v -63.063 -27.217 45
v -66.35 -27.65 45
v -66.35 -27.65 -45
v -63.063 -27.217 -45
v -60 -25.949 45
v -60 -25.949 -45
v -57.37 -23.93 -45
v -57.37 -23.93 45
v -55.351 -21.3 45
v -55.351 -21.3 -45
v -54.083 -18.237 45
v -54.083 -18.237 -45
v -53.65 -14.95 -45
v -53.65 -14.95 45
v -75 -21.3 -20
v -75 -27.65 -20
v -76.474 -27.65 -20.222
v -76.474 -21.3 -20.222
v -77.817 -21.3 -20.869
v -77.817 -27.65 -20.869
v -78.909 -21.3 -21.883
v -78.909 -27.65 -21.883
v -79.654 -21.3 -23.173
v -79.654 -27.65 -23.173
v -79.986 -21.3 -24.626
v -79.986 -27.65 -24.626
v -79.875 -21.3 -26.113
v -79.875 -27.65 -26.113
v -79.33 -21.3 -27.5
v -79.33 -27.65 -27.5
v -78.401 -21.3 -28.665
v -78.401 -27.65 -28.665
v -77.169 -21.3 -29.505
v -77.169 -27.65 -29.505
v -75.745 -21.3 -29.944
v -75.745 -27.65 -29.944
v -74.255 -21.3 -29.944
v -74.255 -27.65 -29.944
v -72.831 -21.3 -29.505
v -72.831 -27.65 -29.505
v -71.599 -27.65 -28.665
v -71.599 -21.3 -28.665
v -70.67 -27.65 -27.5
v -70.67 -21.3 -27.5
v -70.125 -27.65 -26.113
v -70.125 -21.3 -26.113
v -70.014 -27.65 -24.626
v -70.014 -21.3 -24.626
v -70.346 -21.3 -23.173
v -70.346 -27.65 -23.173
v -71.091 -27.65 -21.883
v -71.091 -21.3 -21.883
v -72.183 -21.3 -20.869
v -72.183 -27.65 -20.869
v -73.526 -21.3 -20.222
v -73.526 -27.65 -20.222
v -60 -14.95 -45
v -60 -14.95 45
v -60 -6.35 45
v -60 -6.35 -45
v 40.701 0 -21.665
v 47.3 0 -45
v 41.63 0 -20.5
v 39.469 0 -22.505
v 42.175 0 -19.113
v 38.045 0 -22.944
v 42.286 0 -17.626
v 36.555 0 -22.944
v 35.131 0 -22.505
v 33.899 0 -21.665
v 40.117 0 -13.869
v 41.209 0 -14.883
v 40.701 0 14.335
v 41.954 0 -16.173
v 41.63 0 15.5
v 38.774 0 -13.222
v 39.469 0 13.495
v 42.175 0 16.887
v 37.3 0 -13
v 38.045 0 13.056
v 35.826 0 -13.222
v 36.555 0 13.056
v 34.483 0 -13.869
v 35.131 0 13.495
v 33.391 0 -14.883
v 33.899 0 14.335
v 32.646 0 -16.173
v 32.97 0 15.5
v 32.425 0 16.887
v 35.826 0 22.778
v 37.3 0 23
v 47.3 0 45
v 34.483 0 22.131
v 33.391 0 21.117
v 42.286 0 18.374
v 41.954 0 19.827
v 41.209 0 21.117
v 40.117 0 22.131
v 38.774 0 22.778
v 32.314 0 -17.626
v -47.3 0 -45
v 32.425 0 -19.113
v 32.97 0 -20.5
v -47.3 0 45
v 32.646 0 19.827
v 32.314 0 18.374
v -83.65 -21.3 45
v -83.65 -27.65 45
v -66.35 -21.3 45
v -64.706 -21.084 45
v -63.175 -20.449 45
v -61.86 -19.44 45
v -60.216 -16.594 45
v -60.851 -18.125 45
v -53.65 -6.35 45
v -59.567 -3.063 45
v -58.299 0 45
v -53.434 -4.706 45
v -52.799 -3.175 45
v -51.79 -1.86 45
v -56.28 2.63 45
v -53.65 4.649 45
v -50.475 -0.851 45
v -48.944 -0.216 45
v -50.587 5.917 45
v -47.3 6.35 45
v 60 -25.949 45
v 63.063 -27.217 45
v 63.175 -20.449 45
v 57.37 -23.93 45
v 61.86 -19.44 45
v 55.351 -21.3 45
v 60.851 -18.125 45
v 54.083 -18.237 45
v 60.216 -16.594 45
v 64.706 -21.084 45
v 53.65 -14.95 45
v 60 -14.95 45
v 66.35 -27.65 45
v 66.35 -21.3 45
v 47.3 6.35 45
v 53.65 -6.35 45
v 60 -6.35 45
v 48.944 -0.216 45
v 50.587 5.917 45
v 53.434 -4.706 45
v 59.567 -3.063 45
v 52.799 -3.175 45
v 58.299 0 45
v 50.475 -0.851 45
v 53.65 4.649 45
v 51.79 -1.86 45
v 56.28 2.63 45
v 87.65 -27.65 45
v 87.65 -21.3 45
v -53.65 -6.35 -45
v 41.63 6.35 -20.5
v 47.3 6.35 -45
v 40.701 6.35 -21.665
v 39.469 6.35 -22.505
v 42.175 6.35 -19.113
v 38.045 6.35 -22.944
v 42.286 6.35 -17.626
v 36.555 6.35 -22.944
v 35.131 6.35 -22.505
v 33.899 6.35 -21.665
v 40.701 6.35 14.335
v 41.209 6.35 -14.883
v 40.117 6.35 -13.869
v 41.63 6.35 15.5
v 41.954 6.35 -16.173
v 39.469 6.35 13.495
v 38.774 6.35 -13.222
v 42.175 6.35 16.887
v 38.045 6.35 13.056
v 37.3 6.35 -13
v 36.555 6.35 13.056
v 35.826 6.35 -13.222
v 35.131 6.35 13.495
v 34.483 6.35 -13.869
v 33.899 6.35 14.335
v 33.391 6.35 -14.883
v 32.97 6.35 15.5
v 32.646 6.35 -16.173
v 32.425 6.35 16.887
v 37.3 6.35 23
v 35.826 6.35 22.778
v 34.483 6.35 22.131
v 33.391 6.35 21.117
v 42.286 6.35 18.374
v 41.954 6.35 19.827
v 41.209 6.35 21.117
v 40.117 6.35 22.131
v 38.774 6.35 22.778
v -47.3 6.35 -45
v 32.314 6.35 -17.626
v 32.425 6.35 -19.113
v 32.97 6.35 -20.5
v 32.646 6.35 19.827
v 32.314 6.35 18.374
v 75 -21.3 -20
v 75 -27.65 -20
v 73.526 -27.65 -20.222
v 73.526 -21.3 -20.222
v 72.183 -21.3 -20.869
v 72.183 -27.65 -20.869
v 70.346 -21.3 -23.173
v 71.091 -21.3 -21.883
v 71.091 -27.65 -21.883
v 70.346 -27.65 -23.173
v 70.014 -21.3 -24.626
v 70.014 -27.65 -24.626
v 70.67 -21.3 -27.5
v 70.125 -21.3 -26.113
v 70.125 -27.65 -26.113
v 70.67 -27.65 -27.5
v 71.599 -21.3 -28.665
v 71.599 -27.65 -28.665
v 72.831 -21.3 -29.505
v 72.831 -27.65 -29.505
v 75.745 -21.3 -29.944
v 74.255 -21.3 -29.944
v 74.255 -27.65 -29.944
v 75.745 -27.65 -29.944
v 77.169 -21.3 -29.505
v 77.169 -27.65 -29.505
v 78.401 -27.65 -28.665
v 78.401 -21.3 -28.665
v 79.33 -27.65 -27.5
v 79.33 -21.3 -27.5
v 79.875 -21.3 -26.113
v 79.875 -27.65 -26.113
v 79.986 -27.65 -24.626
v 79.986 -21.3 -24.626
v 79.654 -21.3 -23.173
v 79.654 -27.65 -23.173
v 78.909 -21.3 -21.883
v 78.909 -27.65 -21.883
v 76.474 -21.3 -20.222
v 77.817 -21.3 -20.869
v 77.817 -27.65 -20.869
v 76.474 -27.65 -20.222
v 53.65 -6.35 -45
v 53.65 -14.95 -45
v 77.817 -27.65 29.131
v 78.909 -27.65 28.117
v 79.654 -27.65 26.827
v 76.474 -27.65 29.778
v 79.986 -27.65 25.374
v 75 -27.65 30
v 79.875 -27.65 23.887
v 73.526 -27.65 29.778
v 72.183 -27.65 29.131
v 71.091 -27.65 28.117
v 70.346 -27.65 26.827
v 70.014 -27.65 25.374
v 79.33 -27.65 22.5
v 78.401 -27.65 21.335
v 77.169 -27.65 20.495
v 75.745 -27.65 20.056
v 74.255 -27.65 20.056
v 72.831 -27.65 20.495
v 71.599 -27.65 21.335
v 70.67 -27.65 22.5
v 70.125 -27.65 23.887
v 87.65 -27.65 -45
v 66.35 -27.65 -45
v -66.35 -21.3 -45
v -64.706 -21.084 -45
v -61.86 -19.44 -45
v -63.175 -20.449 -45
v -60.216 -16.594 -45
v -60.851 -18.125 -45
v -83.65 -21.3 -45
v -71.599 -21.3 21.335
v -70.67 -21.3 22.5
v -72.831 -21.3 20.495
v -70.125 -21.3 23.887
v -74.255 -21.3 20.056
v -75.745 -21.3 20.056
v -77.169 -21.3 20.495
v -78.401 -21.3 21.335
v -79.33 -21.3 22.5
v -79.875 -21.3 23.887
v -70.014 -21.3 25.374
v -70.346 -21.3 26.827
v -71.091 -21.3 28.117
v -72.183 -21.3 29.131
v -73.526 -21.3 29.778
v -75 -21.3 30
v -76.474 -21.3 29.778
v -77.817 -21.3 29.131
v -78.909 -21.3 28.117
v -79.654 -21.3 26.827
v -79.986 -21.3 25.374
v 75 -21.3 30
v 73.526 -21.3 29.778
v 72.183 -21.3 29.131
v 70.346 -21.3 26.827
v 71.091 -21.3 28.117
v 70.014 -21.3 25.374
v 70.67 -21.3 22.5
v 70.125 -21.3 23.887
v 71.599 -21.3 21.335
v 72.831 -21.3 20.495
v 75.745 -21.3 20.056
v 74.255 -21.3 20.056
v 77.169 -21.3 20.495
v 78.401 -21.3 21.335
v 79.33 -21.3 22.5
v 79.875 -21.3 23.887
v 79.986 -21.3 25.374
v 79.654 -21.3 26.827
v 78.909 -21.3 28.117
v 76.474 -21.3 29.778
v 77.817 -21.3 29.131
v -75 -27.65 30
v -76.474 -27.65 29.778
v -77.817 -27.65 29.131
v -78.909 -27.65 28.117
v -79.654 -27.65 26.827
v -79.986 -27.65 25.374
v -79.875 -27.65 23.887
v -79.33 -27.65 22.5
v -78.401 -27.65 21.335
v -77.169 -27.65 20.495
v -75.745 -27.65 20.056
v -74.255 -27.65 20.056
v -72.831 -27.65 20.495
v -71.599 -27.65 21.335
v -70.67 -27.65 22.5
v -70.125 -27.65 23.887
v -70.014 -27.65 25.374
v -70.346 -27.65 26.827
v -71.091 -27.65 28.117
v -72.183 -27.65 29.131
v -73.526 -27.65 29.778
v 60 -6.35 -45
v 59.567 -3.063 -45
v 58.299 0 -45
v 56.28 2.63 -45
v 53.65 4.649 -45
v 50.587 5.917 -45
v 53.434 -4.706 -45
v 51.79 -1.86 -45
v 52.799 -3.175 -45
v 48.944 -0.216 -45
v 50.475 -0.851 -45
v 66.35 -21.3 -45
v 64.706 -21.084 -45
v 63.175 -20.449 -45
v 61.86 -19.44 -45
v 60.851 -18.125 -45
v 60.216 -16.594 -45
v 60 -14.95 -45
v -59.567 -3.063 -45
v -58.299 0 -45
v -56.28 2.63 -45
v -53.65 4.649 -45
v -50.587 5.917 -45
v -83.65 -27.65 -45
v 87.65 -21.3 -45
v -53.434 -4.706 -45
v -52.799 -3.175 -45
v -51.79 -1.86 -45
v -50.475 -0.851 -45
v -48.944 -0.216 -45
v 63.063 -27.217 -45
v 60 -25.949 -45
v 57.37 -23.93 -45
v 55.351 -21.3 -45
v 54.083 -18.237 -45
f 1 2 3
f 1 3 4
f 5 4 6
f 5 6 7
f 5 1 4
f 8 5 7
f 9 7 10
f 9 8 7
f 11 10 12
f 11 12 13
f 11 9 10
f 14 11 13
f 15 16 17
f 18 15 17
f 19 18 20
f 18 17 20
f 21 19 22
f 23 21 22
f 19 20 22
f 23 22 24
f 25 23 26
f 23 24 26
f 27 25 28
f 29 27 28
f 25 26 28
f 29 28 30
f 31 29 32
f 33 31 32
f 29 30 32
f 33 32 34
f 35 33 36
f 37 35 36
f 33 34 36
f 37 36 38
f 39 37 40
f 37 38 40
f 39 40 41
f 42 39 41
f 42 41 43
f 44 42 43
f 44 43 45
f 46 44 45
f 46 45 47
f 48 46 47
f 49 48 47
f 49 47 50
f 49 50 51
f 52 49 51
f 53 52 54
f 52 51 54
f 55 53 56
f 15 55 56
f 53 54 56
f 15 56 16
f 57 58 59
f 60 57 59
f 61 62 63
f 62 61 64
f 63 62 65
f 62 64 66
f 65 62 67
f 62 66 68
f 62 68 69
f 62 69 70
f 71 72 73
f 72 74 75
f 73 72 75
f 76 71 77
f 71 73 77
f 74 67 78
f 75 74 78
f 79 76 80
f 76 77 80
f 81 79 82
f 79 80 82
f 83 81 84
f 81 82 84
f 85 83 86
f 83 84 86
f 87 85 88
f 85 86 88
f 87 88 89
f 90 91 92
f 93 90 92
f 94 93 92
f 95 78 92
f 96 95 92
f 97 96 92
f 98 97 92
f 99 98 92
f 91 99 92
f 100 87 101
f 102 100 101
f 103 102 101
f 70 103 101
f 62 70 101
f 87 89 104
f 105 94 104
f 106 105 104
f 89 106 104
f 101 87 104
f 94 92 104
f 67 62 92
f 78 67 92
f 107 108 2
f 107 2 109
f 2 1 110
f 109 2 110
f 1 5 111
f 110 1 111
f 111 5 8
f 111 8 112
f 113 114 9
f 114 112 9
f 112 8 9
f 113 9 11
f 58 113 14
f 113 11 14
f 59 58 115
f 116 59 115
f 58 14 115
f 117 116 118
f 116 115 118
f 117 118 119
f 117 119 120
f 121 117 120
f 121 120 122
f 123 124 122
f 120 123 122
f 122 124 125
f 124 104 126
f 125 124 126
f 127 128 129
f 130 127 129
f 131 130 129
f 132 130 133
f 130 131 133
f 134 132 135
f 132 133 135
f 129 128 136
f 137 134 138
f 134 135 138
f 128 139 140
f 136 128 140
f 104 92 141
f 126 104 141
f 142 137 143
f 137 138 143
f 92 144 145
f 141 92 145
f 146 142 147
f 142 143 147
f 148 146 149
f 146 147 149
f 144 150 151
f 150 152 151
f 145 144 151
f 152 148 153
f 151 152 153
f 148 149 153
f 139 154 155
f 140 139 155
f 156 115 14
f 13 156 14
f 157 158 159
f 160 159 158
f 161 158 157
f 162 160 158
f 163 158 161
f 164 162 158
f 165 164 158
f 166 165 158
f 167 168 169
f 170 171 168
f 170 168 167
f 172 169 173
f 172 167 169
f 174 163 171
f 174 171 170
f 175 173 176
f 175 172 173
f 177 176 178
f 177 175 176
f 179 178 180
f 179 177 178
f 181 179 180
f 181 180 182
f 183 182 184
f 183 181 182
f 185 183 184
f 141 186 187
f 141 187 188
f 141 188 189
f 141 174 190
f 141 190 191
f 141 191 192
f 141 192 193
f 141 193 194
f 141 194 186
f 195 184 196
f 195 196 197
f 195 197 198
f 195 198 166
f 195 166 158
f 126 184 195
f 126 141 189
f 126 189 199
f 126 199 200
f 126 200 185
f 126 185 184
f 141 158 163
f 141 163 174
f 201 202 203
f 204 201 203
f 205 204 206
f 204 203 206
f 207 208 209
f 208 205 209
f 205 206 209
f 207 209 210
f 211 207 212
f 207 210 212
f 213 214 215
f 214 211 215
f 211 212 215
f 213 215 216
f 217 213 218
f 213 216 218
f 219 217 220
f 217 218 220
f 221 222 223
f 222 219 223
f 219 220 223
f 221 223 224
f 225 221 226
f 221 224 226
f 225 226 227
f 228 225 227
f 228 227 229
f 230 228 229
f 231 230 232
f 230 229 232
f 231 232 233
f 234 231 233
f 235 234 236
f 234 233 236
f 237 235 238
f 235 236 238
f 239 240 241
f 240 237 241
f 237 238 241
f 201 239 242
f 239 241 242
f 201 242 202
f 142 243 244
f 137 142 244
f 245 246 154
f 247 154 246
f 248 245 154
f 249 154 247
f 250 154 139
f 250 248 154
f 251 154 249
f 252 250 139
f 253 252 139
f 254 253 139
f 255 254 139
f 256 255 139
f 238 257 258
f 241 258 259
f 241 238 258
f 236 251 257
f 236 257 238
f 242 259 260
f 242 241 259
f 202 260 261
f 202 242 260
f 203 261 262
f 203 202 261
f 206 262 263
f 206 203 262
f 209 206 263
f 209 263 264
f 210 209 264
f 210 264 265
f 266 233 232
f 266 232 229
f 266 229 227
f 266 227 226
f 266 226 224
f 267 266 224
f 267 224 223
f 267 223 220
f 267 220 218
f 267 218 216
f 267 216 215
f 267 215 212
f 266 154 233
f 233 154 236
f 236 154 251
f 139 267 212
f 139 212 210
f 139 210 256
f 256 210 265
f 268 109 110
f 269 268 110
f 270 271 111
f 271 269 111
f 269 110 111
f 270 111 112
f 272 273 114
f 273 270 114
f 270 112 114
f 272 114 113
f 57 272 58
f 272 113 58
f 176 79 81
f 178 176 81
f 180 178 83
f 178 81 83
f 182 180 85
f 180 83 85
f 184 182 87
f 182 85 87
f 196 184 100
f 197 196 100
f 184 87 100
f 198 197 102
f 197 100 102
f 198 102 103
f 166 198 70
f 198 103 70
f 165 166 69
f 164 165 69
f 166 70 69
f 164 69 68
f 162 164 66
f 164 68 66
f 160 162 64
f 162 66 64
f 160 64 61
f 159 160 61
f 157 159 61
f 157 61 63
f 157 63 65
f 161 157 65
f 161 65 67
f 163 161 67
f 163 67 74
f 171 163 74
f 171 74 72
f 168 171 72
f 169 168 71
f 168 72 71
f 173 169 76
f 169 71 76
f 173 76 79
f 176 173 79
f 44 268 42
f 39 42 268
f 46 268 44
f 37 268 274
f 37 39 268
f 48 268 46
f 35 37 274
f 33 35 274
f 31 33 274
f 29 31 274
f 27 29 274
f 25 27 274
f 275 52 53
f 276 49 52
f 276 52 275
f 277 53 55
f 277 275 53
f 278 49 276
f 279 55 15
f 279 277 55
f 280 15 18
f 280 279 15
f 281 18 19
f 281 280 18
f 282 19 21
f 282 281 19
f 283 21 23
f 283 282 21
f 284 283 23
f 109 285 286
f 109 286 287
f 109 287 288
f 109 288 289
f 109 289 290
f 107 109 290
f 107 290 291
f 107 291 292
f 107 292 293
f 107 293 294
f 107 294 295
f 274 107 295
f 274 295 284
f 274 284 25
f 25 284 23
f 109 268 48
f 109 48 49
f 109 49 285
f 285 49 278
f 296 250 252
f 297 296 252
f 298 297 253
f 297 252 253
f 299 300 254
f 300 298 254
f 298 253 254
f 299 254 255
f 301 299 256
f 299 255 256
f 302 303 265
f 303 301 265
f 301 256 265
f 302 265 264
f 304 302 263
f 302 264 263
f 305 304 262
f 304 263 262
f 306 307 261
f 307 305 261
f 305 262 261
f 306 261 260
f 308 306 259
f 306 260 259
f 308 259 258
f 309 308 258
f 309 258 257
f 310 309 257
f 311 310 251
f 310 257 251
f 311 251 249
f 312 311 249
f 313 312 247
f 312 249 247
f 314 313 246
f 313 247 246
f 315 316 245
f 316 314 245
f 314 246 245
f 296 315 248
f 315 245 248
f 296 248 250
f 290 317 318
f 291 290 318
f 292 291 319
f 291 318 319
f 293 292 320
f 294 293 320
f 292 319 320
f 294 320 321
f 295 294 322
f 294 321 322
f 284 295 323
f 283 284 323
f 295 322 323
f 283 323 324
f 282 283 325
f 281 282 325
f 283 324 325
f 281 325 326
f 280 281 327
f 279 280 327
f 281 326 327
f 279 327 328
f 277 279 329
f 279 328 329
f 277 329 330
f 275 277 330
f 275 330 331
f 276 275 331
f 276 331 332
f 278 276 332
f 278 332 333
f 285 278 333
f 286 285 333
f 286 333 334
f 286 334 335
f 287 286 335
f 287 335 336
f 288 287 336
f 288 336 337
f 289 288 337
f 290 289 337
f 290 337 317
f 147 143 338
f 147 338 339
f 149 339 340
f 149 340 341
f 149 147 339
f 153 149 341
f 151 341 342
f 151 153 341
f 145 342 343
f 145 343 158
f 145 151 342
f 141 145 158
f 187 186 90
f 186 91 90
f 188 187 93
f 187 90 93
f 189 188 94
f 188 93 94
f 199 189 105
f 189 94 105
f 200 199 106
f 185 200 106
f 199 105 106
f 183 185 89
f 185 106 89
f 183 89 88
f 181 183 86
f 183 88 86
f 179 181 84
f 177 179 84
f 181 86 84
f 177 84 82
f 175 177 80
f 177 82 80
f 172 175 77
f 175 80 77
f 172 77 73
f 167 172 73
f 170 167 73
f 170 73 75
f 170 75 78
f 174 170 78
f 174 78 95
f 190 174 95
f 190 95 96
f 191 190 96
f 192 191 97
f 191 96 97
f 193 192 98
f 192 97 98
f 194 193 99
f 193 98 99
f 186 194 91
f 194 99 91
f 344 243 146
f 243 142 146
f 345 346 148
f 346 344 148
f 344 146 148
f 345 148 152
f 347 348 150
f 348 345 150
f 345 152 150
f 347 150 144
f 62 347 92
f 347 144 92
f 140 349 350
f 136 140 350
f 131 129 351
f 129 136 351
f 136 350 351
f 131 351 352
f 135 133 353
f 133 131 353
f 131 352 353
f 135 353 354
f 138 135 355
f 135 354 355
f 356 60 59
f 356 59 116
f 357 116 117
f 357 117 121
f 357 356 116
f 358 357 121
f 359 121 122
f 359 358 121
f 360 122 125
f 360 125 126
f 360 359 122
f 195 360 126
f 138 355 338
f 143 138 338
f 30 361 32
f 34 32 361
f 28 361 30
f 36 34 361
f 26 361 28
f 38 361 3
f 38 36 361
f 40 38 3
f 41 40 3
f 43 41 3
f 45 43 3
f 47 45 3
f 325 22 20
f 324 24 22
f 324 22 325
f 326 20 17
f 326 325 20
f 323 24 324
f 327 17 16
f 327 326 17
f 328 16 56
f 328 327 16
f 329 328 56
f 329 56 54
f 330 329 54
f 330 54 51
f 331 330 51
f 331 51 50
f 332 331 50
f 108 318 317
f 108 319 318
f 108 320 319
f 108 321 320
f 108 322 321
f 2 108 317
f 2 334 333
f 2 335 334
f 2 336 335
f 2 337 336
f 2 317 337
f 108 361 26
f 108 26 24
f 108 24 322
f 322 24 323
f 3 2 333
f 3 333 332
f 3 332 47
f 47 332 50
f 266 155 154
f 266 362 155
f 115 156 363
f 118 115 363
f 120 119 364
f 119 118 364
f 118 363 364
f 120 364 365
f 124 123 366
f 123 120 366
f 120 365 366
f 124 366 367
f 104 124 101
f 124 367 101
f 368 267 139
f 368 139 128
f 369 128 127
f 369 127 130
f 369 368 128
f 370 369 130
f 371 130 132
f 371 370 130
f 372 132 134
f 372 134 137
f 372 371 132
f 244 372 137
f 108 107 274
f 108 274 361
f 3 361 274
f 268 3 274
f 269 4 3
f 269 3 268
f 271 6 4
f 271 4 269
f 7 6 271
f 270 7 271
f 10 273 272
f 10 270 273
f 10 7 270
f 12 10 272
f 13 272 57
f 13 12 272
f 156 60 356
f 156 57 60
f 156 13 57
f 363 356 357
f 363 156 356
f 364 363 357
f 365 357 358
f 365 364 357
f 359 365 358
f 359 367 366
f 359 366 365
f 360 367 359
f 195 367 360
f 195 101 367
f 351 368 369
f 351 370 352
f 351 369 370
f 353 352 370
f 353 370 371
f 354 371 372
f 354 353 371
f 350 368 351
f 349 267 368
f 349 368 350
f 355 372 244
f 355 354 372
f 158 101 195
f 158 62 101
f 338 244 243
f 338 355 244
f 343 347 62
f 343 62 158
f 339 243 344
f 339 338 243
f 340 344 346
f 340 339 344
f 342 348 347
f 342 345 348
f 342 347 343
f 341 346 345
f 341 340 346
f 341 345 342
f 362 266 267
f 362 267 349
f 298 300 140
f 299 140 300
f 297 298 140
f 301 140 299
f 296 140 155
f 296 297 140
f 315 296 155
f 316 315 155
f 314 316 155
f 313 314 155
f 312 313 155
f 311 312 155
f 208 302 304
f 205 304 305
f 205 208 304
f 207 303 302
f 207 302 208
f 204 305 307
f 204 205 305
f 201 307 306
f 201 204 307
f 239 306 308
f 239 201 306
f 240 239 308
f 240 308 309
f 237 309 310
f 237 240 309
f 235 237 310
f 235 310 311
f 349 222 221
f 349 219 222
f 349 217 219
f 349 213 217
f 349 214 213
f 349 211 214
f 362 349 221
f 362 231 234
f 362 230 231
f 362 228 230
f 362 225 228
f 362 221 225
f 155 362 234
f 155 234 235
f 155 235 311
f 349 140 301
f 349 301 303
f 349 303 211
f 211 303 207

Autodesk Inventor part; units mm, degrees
ref_plane "YZ Plane" through (0, 0, 0) normal (1, 0, 0) x (0, 1, 0)
ref_plane "XZ Plane" through (0, 0, 0) normal (0, 1, 0) x (-1, 0, 0)
ref_plane "XY Plane" through (0, 0, 0) normal (0, 0, 1) x (1, 0, 0)
sketch "Sketch1" plane through (0, 0, 0) normal (0, 1, 0) x (-1, 0, 0)
  line L0 (60, 45) -> (-60, 45)
  line L1 (-60, 45) -> (-60, -45)
  line L2 (-60, -45) -> (60, -45)
  line L3 (60, -45) -> (60, 45)
  point P0 (0, 0)
  point P1 (0, 0)
  dimension "d0" = 120
  dimension "d1" = 60
  dimension "d2" = 90
  dimension "d3" = 45
extrude "Plate1" add sketch "Sketch1" along normal blind 6.35
sketch "Sketch2" plane through (-53.65, 6.35, 45) normal (-1, 0, 0) x (0, 1, 0)
  line L0 (0, -90) -> (0, 0)
  line L1 (0, 0) -> (-34, 0)
  line L2 (-34, 0) -> (-34, -90)
  line L3 (-34, -90) -> (0, -90)
edge flange "Flange1" height 34 angle 90 thickness 6.35 bend radius 6.35 thickness toward (-1, 0, 0) relief tear relief width 6.35 relief depth 3.175 edges at (-60, 6.35, 0) wall of the first edge with corners at (-53.65, 6.35, -45) (-53.65, 6.35, 45) (-53.65, -27.65, 45) (-53.65, -27.65, -45)
bend "Bend1"
corner "Corner1"
sketch "Sketch4" plane through (-53.65, -21.3, -45) normal (0, -1, 0) x (-1, 0, 0)
  line L0 (0, 90) -> (0, 0)
  line L1 (0, 0) -> (30, 0)
  line L2 (30, 0) -> (30, 90)
  line L3 (30, 90) -> (0, 90)
edge flange "Flange3" height 30 angle 90 thickness 6.35 bend radius 6.35 thickness toward (0, -1, 0) relief tear relief width 6.35 relief depth 3.175 edges at (-53.65, -27.65, 0) wall of the first edge with corners at (-53.65, -21.3, 45) (-53.65, -21.3, -45) (-83.65, -21.3, -45) (-83.65, -21.3, 45)
bend "Bend3"
corner "Corner3"
sketch "Sketch5" plane through (53.65, 6.35, 45) normal (1, 0, 0) x (0, 1, 0)
  line L0 (0, -90) -> (0, 0)
  line L1 (0, 0) -> (-34, 0)
  line L2 (-34, 0) -> (-34, -90)
  line L3 (-34, -90) -> (0, -90)
edge flange "Flange4" height 34 angle 90 thickness 6.35 bend radius 6.35 thickness toward (1, 0, 0) relief tear relief width 6.35 relief depth 3.175 edges at (60, 0, 0) wall of the first edge with corners at (53.65, 6.35, -45) (53.65, 6.35, 45) (53.65, -27.65, 45) (53.65, -27.65, -45)
bend "Bend4"
corner "Corner4"
sketch "Sketch6" plane through (53.65, -21.3, 45) normal (0, -1, 0) x (-1, 0, 0)
  line L0 (0, -90) -> (0, 0)
  line L1 (0, 0) -> (-34, 0)
  line L2 (-34, 0) -> (-34, -90)
  line L3 (-34, -90) -> (0, -90)
edge flange "Flange5" height 34 angle 90 thickness 6.35 bend radius 6.35 thickness toward (0, -1, 0) relief tear relief width 6.35 relief depth 3.175 edges at (53.65, -27.65, 0) wall of the first edge with corners at (53.65, -21.3, -45) (53.65, -21.3, 45) (87.65, -21.3, 45) (87.65, -21.3, -45)
bend "Bend5"
corner "Corner5"
sketch "Sketch7" plane through (0, 6.35, 0) normal (0, 1, 0) x (1, 0, 0)
  line L0 (37.3, 18) -> (37.3, -18)
  line L1 (47.3, -45) -> (47.3, 45) projected
  point P0 (0, 0)
  dimension "d55" = 36
  dimension "d56" = 18
  dimension "d57" = 10
hole "Hole1" at (37.3, 6.35, -18) at (37.3, 6.35, 18) direction (0, -1, 0) diameter 10 depth 6.35
sketch "Sketch8" plane through (-83.65, -21.3, 45) normal (0, 1, 0) x (1, 0, 0)
  line L0 (17.3, 0) -> (0, 0) projected
  line L1 (8.65, 0) -> (8.65, 90)
  line L2 (0, 90) -> (17.3, 90) projected
  line L3 (0, 0) -> (0, 90) projected
  line L4 (0, 20) -> (17.3, 20)
  line L5 (17.3, 0) -> (17.3, 90) projected
  line L6 (0, 70) -> (17.3, 70)
  point P0 (83.65, 45)
  point P1 (8.65, 20)
  point P2 (8.65, 70)
  dimension "d65" = 20
  dimension "d66" = 20
hole "Hole2" at (-75, -21.3, 25) at (-75, -21.3, -25) direction (0, -1, 0) diameter 10 depth 6.35
mirror "Mirror1" about plane through (0, 0, 0) normal (1, 0, 0) of "Hole2"
equation "\"d56\" = 0.5 * d55"
equation "\"d63\" = Thickness"
equation "\"d72\" = Thickness"
equation "\"d4\" = Thickness"
equation "\"d5\" = BendReliefWidth"
equation "\"d6\" = BendReliefDepth"
equation "\"d7\" = MinimumRemnant"
equation "\"d8\" = TransitionRadius"
equation "\"d11\" = BendRadius"
equation "\"d12\" = CornerReliefSize"
equation "\"d13\" = GapSize"
equation "\"d14\" = JacobiRadiusSize"
equation "\"d25\" = BendReliefWidth"
equation "\"d26\" = BendReliefDepth"
equation "\"d27\" = MinimumRemnant"
equation "\"d28\" = TransitionRadius"
equation "\"d31\" = BendRadius"
equation "\"d32\" = CornerReliefSize"
equation "\"d33\" = GapSize"
equation "\"d34\" = JacobiRadiusSize"
equation "\"d35\" = BendReliefWidth"
equation "\"d36\" = BendReliefDepth"
equation "\"d37\" = MinimumRemnant"
equation "\"d38\" = TransitionRadius"
equation "\"d41\" = BendRadius"
equation "\"d42\" = CornerReliefSize"
equation "\"d43\" = GapSize"
equation "\"d44\" = JacobiRadiusSize"
equation "\"d45\" = BendReliefWidth"
equation "\"d46\" = BendReliefDepth"
equation "\"d47\" = MinimumRemnant"
equation "\"d48\" = TransitionRadius"
equation "\"d51\" = BendRadius"
equation "\"d52\" = CornerReliefSize"
equation "\"d53\" = GapSize"
equation "\"d54\" = JacobiRadiusSize"
equation "\"d1\" = 0.5 * d0"
equation "\"d3\" = 0.5 * d2"
equation "\"BendRadius\" = Thickness"
equation "\"BendReliefWidth\" = Thickness"
equation "\"BendReliefDepth\" = 0.5 * Thickness"
equation "\"CornerReliefSize\" = 4 * Thickness"
equation "\"MinimumRemnant\" = 2 * Thickness"
equation "\"TransitionRadius\" = BendRadius"
equation "\"JacobiRadiusSize\" = BendRadius"
equation "\"GapSize\" = Thickness"
equation "\"Thickness\" = 6.35"
properties part number "PlacaActuadorAvance"
